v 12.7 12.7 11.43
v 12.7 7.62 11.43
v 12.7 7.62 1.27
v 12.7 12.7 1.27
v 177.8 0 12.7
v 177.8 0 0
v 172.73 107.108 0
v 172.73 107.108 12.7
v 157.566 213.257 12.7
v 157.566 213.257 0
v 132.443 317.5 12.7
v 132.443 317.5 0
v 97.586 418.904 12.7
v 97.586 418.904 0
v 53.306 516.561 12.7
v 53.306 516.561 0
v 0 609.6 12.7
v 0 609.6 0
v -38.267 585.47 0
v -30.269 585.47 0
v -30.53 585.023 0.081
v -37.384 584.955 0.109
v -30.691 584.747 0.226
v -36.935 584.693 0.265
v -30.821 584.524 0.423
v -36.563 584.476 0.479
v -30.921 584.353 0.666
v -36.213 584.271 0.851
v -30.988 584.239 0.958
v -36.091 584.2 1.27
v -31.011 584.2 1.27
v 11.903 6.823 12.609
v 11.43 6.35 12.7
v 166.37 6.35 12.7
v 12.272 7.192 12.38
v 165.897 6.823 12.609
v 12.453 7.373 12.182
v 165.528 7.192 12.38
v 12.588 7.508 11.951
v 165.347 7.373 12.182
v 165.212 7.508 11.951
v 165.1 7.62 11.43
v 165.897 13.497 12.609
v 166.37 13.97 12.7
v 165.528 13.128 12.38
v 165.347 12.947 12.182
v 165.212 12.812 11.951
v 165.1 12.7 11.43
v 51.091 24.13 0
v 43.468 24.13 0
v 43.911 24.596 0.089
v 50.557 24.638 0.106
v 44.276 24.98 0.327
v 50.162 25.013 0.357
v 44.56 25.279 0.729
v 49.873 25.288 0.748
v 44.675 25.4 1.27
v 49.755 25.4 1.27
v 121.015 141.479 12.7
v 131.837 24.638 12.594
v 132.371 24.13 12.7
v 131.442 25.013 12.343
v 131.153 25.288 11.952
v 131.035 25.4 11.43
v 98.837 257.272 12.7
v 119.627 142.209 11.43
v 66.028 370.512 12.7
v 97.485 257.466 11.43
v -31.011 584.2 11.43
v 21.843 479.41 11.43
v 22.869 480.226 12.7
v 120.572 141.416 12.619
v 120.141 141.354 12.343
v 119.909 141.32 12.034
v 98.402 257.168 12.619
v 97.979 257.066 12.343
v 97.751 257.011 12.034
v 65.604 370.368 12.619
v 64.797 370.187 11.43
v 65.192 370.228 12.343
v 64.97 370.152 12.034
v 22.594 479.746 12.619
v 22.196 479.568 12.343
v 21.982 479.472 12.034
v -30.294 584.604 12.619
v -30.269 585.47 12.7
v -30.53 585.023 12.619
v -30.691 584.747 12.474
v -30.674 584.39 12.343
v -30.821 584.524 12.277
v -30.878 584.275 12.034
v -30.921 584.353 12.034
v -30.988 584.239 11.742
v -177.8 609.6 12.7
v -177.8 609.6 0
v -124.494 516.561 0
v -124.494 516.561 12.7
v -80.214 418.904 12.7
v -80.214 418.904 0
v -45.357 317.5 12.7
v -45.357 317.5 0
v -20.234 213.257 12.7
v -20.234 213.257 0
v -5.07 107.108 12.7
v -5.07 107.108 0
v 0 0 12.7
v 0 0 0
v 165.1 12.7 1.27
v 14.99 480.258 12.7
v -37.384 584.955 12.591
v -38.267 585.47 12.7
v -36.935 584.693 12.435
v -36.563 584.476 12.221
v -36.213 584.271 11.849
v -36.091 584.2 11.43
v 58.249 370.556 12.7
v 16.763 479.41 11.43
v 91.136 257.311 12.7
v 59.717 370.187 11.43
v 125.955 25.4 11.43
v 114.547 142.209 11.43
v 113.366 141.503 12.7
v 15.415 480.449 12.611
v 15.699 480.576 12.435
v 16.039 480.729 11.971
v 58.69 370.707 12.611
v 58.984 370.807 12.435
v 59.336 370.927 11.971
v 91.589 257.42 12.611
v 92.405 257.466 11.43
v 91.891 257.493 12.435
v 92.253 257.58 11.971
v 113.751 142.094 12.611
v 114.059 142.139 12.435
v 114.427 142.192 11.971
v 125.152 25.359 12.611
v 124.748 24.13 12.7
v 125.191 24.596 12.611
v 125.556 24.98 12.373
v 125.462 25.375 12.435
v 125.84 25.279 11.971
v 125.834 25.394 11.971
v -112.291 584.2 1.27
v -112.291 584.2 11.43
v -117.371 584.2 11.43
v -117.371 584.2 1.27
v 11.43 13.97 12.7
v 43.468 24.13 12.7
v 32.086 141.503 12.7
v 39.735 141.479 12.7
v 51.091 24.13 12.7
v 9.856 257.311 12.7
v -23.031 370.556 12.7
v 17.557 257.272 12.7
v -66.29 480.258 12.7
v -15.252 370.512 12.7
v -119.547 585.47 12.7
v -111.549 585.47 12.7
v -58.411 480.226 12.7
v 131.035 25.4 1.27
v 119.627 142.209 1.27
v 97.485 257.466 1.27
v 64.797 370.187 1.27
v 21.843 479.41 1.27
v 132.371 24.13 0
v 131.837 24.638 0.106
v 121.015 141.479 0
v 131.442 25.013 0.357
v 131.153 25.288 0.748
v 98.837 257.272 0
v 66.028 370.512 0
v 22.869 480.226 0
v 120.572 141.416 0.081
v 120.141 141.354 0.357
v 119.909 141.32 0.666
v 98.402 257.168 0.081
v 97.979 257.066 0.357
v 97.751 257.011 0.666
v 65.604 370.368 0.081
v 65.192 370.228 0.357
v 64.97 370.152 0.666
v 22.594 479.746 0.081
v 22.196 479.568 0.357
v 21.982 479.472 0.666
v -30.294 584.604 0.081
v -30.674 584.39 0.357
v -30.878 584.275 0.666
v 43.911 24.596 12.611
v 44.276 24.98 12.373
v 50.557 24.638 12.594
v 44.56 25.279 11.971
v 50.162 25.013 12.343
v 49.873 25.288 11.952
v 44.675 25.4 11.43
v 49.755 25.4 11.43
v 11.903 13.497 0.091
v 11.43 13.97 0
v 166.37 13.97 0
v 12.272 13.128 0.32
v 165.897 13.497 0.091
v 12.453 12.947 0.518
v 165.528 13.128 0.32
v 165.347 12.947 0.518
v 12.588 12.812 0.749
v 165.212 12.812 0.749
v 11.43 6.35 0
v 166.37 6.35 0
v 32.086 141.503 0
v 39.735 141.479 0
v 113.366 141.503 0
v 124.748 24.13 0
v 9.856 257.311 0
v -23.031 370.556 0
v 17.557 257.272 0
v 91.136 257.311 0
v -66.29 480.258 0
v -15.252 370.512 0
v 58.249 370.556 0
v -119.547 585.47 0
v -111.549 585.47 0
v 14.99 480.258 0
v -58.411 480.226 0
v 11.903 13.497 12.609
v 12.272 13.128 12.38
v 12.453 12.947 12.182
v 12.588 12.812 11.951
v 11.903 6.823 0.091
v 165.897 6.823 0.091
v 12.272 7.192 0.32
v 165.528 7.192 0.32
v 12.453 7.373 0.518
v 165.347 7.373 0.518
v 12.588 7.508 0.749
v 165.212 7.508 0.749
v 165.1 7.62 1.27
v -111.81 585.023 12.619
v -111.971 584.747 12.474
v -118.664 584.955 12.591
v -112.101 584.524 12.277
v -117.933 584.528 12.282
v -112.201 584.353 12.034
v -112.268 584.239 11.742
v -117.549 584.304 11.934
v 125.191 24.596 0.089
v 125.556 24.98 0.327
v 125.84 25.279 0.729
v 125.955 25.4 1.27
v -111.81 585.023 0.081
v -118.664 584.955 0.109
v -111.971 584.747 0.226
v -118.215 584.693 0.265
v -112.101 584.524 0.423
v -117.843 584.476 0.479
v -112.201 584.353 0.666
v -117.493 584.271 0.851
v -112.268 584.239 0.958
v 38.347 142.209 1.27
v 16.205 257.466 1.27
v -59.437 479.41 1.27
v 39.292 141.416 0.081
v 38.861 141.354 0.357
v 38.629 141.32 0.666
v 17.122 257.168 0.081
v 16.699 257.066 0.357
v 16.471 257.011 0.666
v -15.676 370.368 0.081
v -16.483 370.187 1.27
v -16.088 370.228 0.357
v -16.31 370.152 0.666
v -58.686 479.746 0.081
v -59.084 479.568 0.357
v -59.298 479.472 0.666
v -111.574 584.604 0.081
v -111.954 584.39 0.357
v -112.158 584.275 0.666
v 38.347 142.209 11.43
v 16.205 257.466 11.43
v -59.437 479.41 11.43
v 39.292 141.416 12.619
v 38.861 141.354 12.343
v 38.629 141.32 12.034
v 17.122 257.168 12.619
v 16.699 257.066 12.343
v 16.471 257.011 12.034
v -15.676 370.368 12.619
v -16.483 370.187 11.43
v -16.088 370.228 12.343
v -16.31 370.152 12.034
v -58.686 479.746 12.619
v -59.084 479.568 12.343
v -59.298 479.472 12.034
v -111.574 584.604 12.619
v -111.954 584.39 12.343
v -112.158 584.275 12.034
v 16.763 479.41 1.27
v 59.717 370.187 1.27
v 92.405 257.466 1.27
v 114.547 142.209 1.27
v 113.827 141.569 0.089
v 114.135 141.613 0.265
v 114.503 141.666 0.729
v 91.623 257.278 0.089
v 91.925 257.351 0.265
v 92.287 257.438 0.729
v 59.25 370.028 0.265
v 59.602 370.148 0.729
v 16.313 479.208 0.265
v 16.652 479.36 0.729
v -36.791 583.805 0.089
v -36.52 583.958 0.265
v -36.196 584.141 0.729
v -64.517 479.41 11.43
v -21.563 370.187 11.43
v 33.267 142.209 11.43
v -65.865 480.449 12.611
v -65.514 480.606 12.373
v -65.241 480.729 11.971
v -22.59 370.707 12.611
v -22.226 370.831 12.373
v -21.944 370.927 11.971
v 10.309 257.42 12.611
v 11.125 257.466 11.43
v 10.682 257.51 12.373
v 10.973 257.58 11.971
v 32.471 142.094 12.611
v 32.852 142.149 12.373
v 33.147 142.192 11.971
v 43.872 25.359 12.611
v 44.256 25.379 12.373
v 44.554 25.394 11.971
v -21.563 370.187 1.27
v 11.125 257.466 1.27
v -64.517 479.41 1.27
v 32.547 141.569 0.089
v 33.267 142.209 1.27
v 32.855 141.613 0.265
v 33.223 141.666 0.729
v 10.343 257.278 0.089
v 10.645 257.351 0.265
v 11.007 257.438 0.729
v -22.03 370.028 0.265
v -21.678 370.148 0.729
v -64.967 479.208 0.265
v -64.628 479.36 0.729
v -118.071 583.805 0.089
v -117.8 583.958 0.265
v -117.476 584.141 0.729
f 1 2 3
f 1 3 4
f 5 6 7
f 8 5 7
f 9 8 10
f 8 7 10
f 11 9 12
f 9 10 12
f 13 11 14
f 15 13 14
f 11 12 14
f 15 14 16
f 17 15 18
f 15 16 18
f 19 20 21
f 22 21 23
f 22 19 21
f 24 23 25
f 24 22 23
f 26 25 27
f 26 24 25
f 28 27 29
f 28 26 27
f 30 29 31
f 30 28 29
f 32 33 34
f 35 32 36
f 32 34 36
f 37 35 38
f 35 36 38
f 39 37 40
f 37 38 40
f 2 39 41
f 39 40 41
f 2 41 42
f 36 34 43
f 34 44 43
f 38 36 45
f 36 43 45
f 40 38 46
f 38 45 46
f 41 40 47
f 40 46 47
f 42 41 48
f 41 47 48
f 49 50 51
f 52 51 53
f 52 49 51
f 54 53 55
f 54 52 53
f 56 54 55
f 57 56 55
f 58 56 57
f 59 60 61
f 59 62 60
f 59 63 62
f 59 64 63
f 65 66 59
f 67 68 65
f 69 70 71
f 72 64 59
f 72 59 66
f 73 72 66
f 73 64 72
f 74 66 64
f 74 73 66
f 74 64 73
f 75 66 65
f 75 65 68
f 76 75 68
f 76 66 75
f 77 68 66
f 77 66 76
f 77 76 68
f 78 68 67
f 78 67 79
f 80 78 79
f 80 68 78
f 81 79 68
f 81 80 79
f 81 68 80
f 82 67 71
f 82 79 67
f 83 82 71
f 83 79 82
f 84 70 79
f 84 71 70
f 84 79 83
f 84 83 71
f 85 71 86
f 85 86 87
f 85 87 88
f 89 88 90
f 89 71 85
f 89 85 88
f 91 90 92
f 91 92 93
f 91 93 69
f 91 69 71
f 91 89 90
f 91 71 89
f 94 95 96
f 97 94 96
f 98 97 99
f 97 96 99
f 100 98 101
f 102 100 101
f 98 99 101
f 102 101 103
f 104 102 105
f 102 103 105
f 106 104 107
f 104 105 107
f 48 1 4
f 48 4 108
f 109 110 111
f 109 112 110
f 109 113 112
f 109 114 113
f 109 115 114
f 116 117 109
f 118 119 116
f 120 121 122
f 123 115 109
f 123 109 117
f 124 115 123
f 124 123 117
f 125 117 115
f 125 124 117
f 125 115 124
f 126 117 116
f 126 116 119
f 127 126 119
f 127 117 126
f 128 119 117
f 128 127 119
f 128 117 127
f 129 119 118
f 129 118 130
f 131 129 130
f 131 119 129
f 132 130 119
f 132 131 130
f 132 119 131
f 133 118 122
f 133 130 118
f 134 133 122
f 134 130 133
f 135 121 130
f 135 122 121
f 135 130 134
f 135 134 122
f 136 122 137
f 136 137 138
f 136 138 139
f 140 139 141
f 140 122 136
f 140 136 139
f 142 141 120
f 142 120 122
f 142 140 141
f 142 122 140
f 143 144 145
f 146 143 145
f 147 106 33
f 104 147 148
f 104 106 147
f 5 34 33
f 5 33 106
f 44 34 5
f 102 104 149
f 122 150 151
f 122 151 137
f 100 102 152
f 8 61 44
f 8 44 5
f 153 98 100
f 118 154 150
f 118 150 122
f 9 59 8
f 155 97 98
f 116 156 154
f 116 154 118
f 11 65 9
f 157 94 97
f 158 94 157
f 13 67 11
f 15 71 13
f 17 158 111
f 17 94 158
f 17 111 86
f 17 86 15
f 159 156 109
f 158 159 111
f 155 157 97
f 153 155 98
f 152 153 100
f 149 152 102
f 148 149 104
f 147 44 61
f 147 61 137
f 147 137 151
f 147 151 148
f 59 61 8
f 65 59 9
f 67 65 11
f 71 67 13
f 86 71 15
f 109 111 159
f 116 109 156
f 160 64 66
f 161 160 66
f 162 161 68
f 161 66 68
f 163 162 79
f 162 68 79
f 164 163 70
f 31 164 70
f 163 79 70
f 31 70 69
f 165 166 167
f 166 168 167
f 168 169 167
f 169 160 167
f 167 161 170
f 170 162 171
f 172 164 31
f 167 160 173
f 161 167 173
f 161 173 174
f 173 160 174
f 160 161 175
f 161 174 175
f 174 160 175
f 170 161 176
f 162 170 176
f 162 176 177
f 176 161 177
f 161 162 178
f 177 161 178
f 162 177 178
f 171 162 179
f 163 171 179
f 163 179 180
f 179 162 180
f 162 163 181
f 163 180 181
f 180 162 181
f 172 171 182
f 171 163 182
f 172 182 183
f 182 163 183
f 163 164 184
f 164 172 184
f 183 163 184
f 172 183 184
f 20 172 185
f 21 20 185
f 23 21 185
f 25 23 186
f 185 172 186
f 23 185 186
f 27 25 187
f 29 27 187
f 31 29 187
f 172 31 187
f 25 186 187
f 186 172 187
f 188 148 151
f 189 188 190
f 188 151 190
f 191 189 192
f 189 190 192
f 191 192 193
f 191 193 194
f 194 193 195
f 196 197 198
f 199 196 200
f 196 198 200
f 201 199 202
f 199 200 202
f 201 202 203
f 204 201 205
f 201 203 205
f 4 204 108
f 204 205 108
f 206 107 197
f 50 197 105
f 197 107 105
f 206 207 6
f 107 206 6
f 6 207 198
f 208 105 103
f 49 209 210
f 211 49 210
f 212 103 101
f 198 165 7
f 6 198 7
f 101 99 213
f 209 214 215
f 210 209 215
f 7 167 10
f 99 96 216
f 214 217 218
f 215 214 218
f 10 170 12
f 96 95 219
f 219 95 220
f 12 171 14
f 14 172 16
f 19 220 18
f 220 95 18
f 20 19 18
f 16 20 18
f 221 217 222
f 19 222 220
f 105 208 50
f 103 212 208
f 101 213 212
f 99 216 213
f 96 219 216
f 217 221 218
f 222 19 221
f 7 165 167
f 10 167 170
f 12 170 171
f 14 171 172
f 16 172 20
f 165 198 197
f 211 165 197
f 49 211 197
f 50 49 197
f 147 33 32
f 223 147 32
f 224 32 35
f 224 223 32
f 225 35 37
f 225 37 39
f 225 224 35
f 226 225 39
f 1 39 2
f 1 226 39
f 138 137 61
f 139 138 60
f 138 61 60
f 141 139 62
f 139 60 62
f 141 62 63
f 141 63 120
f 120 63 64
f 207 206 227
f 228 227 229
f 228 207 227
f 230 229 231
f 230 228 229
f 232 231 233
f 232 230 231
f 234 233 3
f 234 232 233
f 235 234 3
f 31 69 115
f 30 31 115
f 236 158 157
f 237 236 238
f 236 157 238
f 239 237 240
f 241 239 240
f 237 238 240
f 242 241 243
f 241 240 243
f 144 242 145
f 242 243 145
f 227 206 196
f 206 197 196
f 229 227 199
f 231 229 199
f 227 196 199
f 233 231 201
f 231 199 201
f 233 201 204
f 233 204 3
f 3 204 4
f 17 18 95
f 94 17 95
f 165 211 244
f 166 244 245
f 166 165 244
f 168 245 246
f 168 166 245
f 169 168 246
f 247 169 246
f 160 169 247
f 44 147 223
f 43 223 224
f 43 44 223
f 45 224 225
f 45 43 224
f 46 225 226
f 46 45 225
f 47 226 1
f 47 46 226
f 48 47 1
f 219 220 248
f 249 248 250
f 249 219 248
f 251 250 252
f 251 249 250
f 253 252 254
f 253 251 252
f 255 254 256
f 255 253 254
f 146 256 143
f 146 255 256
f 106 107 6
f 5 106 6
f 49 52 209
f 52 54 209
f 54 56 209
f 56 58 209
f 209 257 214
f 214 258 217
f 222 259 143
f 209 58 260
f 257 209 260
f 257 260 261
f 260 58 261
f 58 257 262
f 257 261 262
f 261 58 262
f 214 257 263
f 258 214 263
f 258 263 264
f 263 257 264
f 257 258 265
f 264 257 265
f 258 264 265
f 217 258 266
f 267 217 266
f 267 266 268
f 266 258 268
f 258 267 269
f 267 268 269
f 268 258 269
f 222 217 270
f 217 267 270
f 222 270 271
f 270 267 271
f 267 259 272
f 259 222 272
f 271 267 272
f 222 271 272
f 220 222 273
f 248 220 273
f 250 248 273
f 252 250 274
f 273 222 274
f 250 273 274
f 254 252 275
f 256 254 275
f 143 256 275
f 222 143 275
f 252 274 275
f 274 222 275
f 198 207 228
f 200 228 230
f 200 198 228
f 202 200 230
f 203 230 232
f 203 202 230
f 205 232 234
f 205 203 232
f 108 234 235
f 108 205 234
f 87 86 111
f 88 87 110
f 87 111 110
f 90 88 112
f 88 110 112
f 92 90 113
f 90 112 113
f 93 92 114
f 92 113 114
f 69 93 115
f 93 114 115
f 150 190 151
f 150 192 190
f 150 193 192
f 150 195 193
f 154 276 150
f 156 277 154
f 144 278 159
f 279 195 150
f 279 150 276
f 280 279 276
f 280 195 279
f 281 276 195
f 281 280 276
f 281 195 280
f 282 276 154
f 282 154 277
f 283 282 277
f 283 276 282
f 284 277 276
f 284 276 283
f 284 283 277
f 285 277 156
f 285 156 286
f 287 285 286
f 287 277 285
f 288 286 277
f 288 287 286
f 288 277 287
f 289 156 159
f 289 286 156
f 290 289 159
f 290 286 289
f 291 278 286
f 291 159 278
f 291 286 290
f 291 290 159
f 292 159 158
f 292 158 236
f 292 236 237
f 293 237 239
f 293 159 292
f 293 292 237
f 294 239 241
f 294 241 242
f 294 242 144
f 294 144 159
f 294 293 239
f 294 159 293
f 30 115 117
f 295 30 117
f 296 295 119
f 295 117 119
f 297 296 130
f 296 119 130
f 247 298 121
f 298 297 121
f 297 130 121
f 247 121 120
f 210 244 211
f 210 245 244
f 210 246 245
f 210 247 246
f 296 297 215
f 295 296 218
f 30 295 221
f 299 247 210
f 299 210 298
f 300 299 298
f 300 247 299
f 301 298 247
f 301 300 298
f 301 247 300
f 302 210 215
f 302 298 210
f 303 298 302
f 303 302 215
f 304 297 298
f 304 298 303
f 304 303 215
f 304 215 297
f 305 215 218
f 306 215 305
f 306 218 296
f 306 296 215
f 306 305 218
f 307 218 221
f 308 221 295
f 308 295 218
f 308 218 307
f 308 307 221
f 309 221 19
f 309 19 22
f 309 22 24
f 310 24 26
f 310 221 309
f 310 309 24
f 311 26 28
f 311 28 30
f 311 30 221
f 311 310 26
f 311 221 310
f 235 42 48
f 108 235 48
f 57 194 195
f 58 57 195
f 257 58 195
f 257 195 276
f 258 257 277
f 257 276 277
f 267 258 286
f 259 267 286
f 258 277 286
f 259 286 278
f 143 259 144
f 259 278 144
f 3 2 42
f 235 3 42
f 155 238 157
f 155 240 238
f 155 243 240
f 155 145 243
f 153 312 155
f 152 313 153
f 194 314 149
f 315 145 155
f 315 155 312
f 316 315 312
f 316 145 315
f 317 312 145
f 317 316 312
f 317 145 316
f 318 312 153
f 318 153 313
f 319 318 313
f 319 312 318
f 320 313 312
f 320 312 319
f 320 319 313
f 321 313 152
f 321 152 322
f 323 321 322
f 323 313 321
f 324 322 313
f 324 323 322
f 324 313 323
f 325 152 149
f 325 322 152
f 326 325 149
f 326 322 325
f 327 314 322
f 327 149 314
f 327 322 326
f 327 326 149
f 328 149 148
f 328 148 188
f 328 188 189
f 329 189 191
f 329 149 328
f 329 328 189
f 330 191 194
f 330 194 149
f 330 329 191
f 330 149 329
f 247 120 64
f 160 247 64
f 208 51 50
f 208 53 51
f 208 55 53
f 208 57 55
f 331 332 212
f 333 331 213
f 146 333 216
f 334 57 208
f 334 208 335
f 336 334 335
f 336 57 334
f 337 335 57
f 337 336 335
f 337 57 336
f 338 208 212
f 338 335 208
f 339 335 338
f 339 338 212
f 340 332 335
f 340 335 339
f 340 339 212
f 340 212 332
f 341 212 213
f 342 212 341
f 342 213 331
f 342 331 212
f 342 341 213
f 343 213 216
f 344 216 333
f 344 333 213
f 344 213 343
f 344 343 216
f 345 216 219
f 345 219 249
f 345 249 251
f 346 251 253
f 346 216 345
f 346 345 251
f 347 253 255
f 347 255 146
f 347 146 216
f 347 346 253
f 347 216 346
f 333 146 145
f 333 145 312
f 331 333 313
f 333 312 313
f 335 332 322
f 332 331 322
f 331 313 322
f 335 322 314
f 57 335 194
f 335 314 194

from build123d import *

# Parameters (mm, degrees)
F1_DEPTH = 12.7
F3_DEPTH = 12.701
F5_DEPTH = 12.701
F6_W     = 152.4
F6_H     = 5.08
F7_DEPTH = 12.701
F8_R     = 1.27


with BuildPart() as f1:
    # F0 (on Top) → F1 (new body)
    with BuildSketch(Plane.XY):
        with BuildLine():
            ThreePointArc((-177.8, 609.6), (-45.357143, 317.5), (0, 0))
            Line((0, 0), (177.8, 0))
            ThreePointArc((177.8, 0), (132.442857, 317.5), (0, 609.6))
            Line((0, 609.6), (-177.8, 609.6))
        make_face()
    extrude(amount=F1_DEPTH)

    # F2 (on face) → F3 (cut, through all)
    with BuildSketch(Plane.XY.offset(12.7)):
        with BuildLine():
            Line((44.6749, 25.4), (49.7549, 25.4))
            ThreePointArc((49.7549, 25.4), (1.163489, 314.204707), (-112.290582, 584.2))
            Line((-112.290582, 584.2), (-117.370582, 584.2))
            ThreePointArc((-117.370582, 584.2), (-3.916511, 314.204707), (44.6749, 25.4))
        make_face()
    extrude(amount=-F3_DEPTH, mode=Mode.SUBTRACT)

    # F4 (on face) → F5 (cut, through all)
    with BuildSketch(Plane.XY.offset(12.7)):
        with BuildLine():
            ThreePointArc((-36.090582, 584.2), (77.363489, 314.204707), (125.9549, 25.4))
            Line((125.9549, 25.4), (131.0349, 25.4))
            ThreePointArc((131.0349, 25.4), (82.443489, 314.204707), (-31.010582, 584.2))
            Line((-31.010582, 584.2), (-36.090582, 584.2))
        make_face()
    extrude(amount=-F5_DEPTH, mode=Mode.SUBTRACT)

    # F6 (on face) → F7 (cut, through all)
    with BuildSketch(Plane.XY.offset(12.7)):
        with Locations((88.9, 10.16)):
            Rectangle(F6_W, F6_H)
    extrude(amount=-F7_DEPTH, mode=Mode.SUBTRACT)

    # F8
    f8_edges = [f1.edges().sort_by_distance(p)[0] for p in [
        (-114.830582, 584.2, 12.7),
        (1.163489, 314.204707, 12.7),
        (-3.916511, 314.204707, 12.7),
        (47.2149, 25.4, 12.7),
        (88.9, 12.7, 12.7),
        (12.7, 10.16, 12.7),
        (88.9, 7.62, 12.7),
        (165.1, 10.16, 12.7),
        (82.443489, 314.204707, 12.7),
        (77.363489, 314.204707, 12.7),
        (128.4949, 25.4, 12.7),
        (-33.550582, 584.2, 12.7),
        (-114.830582, 584.2, 0),
        (1.163489, 314.204707, 0),
        (-3.916511, 314.204707, 0),
        (47.2149, 25.4, 0),
        (128.4949, 25.4, 0),
        (82.443489, 314.204707, 0),
        (77.363489, 314.204707, 0),
        (-33.550582, 584.2, 0),
        (12.7, 10.16, 0),
        (88.9, 12.7, 0),
        (88.9, 7.62, 0),
        (165.1, 10.16, 0),
    ]]
    fillet(f8_edges, radius=F8_R)


solid = f1.part
